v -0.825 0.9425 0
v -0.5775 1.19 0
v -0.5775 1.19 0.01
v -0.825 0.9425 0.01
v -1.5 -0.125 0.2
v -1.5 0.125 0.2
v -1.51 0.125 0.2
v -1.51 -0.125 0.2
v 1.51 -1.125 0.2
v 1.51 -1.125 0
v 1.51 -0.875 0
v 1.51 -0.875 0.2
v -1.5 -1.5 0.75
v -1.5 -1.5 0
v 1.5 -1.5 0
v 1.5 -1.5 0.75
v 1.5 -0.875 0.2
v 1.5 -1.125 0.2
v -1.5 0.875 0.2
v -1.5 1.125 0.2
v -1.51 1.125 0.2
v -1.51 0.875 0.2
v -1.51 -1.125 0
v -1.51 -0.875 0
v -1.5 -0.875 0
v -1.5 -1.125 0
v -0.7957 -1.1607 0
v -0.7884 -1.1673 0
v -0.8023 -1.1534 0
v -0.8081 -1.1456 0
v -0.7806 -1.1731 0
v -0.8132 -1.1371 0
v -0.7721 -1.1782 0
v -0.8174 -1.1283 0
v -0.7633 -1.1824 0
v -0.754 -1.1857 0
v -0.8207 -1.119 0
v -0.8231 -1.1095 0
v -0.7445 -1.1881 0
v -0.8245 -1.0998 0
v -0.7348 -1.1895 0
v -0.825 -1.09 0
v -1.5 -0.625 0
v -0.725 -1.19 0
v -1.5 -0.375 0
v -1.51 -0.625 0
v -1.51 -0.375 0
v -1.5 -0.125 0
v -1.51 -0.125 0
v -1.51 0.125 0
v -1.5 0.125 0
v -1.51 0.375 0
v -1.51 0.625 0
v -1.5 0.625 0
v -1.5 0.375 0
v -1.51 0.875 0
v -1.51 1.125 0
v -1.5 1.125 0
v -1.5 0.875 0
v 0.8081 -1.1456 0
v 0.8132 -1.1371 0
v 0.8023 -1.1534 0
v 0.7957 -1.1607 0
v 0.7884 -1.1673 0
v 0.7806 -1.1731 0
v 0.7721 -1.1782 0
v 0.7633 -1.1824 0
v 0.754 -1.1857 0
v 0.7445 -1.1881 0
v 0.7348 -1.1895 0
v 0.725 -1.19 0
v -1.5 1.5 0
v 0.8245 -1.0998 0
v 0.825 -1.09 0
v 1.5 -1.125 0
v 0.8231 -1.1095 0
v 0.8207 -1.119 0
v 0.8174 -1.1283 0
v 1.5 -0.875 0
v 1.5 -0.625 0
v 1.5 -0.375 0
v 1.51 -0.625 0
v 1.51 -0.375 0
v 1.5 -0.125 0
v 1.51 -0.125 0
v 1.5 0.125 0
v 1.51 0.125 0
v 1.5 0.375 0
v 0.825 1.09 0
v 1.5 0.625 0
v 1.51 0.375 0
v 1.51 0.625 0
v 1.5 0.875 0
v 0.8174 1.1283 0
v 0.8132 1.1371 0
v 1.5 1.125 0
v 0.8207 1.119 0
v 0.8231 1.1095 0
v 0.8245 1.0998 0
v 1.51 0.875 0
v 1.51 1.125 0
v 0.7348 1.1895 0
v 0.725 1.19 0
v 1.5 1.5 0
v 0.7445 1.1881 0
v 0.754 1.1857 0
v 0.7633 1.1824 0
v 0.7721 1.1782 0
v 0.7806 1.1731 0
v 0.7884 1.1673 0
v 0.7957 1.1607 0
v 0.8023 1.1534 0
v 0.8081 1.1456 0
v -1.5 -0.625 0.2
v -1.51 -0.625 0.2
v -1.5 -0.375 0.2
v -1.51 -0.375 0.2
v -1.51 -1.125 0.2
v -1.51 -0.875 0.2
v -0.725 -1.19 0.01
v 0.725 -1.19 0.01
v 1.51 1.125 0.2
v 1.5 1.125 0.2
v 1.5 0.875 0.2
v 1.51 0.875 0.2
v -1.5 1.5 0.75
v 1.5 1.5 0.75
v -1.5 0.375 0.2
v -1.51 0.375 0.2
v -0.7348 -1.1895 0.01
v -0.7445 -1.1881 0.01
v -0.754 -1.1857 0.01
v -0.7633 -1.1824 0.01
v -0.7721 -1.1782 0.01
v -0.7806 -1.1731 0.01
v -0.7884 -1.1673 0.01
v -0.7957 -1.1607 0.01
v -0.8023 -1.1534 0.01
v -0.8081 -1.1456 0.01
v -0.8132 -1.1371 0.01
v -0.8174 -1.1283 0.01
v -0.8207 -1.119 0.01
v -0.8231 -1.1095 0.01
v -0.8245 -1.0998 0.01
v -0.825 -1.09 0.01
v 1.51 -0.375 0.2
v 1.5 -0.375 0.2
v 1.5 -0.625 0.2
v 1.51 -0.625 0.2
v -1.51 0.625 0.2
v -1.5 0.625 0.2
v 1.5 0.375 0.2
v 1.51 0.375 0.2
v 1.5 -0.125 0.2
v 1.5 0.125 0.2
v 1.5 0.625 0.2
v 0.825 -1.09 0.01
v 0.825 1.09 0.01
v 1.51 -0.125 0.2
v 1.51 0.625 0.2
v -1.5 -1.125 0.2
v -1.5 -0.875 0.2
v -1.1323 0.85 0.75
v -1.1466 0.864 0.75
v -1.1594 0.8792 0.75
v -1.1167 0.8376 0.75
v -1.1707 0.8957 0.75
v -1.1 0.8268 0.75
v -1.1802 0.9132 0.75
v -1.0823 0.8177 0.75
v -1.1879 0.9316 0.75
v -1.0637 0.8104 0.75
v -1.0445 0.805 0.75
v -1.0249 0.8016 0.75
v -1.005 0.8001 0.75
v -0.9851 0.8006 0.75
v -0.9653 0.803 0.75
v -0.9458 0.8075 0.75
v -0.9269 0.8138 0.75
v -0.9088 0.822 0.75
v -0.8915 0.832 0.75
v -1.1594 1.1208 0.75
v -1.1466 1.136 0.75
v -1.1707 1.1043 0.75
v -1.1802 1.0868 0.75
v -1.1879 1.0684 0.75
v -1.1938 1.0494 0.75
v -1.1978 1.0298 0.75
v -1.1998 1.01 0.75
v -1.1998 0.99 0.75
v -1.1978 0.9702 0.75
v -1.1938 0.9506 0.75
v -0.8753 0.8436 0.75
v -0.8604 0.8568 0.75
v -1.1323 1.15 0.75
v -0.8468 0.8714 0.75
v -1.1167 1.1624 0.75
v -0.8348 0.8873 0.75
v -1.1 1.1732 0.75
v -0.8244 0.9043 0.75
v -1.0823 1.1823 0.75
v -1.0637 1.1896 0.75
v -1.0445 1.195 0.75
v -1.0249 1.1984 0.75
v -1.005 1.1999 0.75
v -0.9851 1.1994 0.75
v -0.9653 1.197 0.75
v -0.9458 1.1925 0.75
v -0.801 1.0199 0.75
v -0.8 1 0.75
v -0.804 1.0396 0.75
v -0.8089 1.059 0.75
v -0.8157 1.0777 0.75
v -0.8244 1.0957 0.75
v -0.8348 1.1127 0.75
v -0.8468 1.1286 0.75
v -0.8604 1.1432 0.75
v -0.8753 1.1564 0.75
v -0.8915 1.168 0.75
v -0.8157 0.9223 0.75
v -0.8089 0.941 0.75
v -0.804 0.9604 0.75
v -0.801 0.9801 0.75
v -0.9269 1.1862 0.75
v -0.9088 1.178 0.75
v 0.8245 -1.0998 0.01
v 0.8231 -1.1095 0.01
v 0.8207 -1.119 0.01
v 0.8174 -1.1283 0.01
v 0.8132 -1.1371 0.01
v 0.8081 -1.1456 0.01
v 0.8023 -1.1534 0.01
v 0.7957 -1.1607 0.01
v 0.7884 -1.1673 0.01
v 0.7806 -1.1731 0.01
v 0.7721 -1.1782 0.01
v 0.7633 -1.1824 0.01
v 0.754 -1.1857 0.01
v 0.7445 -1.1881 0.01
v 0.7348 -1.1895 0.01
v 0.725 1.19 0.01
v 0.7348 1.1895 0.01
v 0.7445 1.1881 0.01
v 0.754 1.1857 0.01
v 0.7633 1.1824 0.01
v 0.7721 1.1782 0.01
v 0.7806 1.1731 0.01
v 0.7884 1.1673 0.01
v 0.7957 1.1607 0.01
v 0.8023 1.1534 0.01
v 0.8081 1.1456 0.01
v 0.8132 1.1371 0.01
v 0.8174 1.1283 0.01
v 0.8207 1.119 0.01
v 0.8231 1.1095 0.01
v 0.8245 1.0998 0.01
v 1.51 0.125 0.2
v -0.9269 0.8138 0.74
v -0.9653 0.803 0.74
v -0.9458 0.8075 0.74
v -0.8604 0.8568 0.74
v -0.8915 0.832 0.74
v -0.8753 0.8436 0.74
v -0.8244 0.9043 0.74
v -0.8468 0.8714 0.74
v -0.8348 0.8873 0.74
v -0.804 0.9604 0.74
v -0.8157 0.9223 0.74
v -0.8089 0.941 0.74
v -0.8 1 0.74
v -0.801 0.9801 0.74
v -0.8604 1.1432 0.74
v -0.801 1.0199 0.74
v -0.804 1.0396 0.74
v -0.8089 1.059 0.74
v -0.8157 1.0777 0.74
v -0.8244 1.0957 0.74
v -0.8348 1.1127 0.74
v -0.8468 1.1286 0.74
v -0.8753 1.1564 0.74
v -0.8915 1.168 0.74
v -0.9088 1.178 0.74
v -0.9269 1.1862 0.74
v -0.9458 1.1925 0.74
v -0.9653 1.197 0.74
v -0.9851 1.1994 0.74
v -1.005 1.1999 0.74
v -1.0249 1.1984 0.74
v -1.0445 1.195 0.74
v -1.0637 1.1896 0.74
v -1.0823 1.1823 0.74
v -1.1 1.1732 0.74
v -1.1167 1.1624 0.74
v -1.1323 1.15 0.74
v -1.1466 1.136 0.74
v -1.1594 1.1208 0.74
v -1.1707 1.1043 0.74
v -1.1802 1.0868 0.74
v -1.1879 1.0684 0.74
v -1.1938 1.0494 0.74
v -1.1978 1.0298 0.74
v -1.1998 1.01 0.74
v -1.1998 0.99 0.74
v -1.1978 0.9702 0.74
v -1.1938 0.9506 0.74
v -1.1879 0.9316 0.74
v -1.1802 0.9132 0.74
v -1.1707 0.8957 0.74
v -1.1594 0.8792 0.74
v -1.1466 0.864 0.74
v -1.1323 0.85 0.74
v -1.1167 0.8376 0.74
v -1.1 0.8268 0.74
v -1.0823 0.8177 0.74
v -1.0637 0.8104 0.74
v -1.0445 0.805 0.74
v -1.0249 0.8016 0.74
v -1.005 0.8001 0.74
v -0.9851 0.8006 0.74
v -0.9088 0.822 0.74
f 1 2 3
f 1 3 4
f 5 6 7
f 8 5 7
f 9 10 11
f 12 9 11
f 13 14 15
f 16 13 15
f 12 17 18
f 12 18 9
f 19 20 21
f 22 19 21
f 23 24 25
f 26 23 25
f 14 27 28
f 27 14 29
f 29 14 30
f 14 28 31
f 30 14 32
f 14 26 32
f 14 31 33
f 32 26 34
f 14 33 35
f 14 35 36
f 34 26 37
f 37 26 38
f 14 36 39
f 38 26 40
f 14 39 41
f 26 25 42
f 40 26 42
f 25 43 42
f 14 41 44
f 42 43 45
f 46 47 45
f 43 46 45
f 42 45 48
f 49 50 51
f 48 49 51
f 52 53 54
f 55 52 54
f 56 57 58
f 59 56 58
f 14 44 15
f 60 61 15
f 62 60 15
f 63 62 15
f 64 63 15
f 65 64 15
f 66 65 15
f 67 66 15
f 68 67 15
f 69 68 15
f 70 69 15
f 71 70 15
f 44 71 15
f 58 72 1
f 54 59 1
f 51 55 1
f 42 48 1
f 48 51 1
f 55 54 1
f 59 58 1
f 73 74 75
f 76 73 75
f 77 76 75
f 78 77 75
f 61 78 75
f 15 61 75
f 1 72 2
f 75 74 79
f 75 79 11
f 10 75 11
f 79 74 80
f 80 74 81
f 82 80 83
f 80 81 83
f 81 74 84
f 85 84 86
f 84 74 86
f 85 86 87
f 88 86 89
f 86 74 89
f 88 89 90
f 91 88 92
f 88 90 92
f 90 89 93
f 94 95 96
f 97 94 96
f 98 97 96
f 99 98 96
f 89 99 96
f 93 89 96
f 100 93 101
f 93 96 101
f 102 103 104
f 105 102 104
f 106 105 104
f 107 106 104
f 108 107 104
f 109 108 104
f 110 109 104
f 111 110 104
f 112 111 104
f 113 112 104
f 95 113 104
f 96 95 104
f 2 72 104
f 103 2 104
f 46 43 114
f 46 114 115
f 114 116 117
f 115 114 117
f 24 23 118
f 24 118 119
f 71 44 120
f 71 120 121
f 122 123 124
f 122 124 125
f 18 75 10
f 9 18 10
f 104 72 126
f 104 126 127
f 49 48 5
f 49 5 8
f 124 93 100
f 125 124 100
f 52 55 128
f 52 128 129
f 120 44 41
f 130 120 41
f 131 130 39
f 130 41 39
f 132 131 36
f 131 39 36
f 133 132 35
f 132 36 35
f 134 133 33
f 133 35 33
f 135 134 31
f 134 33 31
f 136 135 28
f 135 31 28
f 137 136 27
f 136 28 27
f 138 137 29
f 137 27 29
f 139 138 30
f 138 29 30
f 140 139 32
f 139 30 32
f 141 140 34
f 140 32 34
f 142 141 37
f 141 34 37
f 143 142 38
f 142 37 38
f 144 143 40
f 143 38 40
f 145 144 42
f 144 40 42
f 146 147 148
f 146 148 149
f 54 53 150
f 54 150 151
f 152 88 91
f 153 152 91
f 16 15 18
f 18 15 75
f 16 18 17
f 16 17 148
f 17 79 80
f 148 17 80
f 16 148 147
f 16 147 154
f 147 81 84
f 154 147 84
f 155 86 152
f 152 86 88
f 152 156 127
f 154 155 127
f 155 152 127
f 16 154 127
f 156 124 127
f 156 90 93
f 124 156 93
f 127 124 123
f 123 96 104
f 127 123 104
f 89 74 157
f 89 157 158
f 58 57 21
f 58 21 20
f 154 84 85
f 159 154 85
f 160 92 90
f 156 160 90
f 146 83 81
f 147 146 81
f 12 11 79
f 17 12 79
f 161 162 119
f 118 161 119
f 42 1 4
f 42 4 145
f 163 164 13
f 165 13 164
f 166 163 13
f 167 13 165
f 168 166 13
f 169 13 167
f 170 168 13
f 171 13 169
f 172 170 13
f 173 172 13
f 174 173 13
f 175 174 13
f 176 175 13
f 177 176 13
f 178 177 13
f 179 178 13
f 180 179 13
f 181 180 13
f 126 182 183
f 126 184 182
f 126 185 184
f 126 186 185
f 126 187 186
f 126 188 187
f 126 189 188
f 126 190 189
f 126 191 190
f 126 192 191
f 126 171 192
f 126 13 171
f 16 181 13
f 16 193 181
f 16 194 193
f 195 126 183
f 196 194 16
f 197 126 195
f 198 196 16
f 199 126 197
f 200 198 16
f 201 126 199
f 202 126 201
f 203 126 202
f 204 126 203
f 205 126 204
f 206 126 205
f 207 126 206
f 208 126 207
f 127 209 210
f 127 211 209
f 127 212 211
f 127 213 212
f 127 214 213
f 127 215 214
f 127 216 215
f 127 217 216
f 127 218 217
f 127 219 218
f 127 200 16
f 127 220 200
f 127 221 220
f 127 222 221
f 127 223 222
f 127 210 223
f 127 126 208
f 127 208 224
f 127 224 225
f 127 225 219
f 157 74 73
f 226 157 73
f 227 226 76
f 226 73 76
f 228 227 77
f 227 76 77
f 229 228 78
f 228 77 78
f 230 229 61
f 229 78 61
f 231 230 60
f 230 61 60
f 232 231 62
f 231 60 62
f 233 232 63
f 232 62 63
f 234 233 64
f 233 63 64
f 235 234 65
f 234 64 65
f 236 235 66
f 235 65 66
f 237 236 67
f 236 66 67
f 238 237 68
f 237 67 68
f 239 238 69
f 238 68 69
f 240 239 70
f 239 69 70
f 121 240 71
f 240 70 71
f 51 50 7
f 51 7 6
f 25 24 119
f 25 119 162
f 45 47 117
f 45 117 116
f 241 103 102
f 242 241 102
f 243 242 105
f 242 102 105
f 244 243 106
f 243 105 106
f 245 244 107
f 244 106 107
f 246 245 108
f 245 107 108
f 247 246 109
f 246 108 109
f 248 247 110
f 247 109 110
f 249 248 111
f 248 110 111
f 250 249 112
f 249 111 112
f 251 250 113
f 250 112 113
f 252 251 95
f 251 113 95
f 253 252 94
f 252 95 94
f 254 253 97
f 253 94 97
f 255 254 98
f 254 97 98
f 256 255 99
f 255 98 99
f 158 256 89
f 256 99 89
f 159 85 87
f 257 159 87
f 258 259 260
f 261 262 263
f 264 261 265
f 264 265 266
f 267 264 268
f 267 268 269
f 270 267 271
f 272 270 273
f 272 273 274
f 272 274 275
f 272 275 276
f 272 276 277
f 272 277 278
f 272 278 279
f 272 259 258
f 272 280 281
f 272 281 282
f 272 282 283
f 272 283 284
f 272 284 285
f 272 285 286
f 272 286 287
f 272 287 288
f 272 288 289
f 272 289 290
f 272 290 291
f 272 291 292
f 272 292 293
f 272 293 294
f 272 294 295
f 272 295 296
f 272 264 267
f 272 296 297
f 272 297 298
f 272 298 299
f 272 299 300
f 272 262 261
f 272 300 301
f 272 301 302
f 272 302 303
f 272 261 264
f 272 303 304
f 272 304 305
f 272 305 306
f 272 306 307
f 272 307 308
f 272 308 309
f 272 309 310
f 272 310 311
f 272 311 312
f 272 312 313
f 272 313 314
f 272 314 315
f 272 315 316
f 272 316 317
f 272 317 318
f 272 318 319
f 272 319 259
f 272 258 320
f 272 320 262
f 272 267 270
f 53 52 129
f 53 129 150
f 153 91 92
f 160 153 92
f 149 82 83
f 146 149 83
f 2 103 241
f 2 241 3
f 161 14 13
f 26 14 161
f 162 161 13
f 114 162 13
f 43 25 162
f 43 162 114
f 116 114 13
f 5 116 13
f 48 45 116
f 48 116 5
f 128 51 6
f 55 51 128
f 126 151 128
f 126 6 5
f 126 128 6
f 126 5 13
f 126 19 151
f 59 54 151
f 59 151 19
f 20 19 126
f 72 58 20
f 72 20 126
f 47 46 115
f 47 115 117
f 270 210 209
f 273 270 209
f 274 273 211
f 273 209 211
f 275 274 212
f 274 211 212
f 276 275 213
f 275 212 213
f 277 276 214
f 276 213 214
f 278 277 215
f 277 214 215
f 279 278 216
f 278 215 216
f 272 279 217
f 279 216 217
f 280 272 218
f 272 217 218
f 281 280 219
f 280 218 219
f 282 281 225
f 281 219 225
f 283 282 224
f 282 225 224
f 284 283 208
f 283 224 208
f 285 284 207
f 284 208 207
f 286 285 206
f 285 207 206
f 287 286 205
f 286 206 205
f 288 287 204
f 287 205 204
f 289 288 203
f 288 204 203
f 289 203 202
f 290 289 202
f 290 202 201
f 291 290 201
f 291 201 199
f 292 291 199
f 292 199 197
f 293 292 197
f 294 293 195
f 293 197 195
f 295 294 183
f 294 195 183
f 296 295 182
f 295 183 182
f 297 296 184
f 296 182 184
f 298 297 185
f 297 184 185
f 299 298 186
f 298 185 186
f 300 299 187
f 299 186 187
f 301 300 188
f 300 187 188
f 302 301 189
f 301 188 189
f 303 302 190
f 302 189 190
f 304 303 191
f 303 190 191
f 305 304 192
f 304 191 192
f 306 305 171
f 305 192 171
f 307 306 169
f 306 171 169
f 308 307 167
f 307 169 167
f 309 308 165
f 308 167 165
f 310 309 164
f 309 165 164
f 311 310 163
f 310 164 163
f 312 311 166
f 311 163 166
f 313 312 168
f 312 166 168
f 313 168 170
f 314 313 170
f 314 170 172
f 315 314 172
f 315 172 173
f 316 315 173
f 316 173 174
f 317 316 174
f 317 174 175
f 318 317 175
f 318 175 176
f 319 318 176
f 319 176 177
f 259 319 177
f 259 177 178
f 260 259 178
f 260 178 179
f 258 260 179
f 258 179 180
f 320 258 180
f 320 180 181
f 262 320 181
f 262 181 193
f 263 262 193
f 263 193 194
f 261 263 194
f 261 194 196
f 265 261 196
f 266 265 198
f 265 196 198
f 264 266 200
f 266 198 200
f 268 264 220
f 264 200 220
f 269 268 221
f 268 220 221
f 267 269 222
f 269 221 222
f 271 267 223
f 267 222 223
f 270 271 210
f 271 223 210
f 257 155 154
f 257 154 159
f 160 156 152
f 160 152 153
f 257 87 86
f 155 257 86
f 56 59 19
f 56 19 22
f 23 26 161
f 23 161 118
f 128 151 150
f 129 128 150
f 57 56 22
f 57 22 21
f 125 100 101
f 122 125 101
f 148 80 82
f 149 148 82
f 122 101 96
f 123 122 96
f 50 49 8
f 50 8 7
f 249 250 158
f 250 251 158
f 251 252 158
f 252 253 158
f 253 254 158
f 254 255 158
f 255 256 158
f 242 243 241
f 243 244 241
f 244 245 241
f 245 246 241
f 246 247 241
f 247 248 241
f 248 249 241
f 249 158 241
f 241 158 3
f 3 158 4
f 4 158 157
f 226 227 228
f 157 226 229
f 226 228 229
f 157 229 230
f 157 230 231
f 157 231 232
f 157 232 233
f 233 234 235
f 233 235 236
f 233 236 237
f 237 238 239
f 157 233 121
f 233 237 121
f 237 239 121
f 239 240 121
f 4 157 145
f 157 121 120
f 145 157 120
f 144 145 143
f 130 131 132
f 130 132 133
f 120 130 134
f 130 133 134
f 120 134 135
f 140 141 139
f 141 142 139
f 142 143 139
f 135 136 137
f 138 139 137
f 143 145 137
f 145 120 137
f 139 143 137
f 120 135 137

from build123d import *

# Parameters (mm, degrees)
SKETCH001_W               = 3
SKETCH001_H               = 3
PAD001_DEPTH              = 0.75
PAD_DEPTH                 = 0.2
PAD_LINEARPATTERN_2_DEPTH = 0.2
PAD_LINEARPATTERN_3_DEPTH = 0.2
PAD_LINEARPATTERN_4_DEPTH = 0.2
PAD_LINEARPATTERN_5_DEPTH = 0.2
SKETCH002_R               = 0.2
POCKET_DEPTH              = 0.01
POCKET001_DEPTH           = 0.01


with BuildPart() as part:
    # Sketch001 → Pad001 (new body)
    with BuildSketch(Plane.XY):
        Rectangle(SKETCH001_W, SKETCH001_H)
    extrude(amount=PAD001_DEPTH)

    # Sketch → Pad (join)
    with BuildSketch(Plane.XY):
        with BuildLine():
            Line((-1.51, 1.125), (-1.235, 1.125))
            ThreePointArc((-1.235, 0.875), (-1.11, 1), (-1.235, 1.125))
            Line((-1.235, 0.875), (-1.51, 0.875))
            Line((-1.51, 0.875), (-1.51, 1.125))
        make_face()
    pad = extrude(amount=PAD_DEPTH)

    # Sketch LinearPattern 2 → Pad LinearPattern 2 (add)
    with BuildSketch(Plane(origin=(0, -0.5, 0), x_dir=(1, 0, 0), z_dir=(0, 0, 1))):
        with BuildLine():
            Line((-1.51, 1.125), (-1.235, 1.125))
            ThreePointArc((-1.235, 0.875), (-1.11, 1), (-1.235, 1.125))
            Line((-1.235, 0.875), (-1.51, 0.875))
            Line((-1.51, 0.875), (-1.51, 1.125))
        make_face()
    pad_linearpattern_2 = extrude(amount=PAD_LINEARPATTERN_2_DEPTH)

    # Sketch LinearPattern 3 → Pad LinearPattern 3 (add)
    with BuildSketch(Plane(origin=(0, -1, 0), x_dir=(1, 0, 0), z_dir=(0, 0, 1))):
        with BuildLine():
            Line((-1.51, 1.125), (-1.235, 1.125))
            ThreePointArc((-1.235, 0.875), (-1.11, 1), (-1.235, 1.125))
            Line((-1.235, 0.875), (-1.51, 0.875))
            Line((-1.51, 0.875), (-1.51, 1.125))
        make_face()
    pad_linearpattern_3 = extrude(amount=PAD_LINEARPATTERN_3_DEPTH)

    # Sketch LinearPattern 4 → Pad LinearPattern 4 (add)
    with BuildSketch(Plane(origin=(0, -1.5, 0), x_dir=(1, 0, 0), z_dir=(0, 0, 1))):
        with BuildLine():
            Line((-1.51, 1.125), (-1.235, 1.125))
            ThreePointArc((-1.235, 0.875), (-1.11, 1), (-1.235, 1.125))
            Line((-1.235, 0.875), (-1.51, 0.875))
            Line((-1.51, 0.875), (-1.51, 1.125))
        make_face()
    pad_linearpattern_4 = extrude(amount=PAD_LINEARPATTERN_4_DEPTH)

    # Sketch LinearPattern 5 → Pad LinearPattern 5 (add)
    with BuildSketch(Plane(origin=(0, -2, 0), x_dir=(1, 0, 0), z_dir=(0, 0, 1))):
        with BuildLine():
            Line((-1.51, 1.125), (-1.235, 1.125))
            ThreePointArc((-1.235, 0.875), (-1.11, 1), (-1.235, 1.125))
            Line((-1.235, 0.875), (-1.51, 0.875))
            Line((-1.51, 0.875), (-1.51, 1.125))
        make_face()
    pad_linearpattern_5 = extrude(amount=PAD_LINEARPATTERN_5_DEPTH)

    # Mirrored: Pad, Pad LinearPattern 2, Pad LinearPattern 3, Pad LinearPattern 4, Pad LinearPattern 5 across Sketch V_Axis
    add(pad.mirror(Plane(origin=(0, 0, 0), x_dir=(0, 0, 1), z_dir=(1, 0, 0))))
    add(pad_linearpattern_2.mirror(Plane(origin=(0, 0, 0), x_dir=(0, 0, 1), z_dir=(1, 0, 0))))
    add(pad_linearpattern_3.mirror(Plane(origin=(0, 0, 0), x_dir=(0, 0, 1), z_dir=(1, 0, 0))))
    add(pad_linearpattern_4.mirror(Plane(origin=(0, 0, 0), x_dir=(0, 0, 1), z_dir=(1, 0, 0))))
    add(pad_linearpattern_5.mirror(Plane(origin=(0, 0, 0), x_dir=(0, 0, 1), z_dir=(1, 0, 0))))

    # Sketch002 (on Face19 of MultiTransform) → Pocket (cut)
    with BuildSketch(Plane.XY.offset(0.75)):
        with Locations((-1, 1)):
            Circle(SKETCH002_R)
    extrude(amount=-POCKET_DEPTH, mode=Mode.SUBTRACT)

    # Sketch003 (on Face2 of Pocket) → Pocket001 (cut)
    with BuildSketch(Plane(origin=(0, 0, 0), x_dir=(1, 0, 0), z_dir=(0, 0, -1))):
        with BuildLine():
            Line((0.725, -1.19), (-0.577513, -1.19))
            Line((-0.577513, -1.19), (-0.825, -0.942513))
            Line((-0.825, -0.942513), (-0.825, 1.09))
            ThreePointArc((-0.725, 1.19), (-0.795711, 1.160711), (-0.825, 1.09))
            Line((-0.725, 1.19), (0.725, 1.19))
            ThreePointArc((0.825, 1.09), (0.795711, 1.160711), (0.725, 1.19))
            Line((0.825, 1.09), (0.825, -1.09))
            ThreePointArc((0.725, -1.19), (0.795711, -1.160711), (0.825, -1.09))
        make_face()
    extrude(amount=-POCKET001_DEPTH, mode=Mode.SUBTRACT)


solid = part.part
